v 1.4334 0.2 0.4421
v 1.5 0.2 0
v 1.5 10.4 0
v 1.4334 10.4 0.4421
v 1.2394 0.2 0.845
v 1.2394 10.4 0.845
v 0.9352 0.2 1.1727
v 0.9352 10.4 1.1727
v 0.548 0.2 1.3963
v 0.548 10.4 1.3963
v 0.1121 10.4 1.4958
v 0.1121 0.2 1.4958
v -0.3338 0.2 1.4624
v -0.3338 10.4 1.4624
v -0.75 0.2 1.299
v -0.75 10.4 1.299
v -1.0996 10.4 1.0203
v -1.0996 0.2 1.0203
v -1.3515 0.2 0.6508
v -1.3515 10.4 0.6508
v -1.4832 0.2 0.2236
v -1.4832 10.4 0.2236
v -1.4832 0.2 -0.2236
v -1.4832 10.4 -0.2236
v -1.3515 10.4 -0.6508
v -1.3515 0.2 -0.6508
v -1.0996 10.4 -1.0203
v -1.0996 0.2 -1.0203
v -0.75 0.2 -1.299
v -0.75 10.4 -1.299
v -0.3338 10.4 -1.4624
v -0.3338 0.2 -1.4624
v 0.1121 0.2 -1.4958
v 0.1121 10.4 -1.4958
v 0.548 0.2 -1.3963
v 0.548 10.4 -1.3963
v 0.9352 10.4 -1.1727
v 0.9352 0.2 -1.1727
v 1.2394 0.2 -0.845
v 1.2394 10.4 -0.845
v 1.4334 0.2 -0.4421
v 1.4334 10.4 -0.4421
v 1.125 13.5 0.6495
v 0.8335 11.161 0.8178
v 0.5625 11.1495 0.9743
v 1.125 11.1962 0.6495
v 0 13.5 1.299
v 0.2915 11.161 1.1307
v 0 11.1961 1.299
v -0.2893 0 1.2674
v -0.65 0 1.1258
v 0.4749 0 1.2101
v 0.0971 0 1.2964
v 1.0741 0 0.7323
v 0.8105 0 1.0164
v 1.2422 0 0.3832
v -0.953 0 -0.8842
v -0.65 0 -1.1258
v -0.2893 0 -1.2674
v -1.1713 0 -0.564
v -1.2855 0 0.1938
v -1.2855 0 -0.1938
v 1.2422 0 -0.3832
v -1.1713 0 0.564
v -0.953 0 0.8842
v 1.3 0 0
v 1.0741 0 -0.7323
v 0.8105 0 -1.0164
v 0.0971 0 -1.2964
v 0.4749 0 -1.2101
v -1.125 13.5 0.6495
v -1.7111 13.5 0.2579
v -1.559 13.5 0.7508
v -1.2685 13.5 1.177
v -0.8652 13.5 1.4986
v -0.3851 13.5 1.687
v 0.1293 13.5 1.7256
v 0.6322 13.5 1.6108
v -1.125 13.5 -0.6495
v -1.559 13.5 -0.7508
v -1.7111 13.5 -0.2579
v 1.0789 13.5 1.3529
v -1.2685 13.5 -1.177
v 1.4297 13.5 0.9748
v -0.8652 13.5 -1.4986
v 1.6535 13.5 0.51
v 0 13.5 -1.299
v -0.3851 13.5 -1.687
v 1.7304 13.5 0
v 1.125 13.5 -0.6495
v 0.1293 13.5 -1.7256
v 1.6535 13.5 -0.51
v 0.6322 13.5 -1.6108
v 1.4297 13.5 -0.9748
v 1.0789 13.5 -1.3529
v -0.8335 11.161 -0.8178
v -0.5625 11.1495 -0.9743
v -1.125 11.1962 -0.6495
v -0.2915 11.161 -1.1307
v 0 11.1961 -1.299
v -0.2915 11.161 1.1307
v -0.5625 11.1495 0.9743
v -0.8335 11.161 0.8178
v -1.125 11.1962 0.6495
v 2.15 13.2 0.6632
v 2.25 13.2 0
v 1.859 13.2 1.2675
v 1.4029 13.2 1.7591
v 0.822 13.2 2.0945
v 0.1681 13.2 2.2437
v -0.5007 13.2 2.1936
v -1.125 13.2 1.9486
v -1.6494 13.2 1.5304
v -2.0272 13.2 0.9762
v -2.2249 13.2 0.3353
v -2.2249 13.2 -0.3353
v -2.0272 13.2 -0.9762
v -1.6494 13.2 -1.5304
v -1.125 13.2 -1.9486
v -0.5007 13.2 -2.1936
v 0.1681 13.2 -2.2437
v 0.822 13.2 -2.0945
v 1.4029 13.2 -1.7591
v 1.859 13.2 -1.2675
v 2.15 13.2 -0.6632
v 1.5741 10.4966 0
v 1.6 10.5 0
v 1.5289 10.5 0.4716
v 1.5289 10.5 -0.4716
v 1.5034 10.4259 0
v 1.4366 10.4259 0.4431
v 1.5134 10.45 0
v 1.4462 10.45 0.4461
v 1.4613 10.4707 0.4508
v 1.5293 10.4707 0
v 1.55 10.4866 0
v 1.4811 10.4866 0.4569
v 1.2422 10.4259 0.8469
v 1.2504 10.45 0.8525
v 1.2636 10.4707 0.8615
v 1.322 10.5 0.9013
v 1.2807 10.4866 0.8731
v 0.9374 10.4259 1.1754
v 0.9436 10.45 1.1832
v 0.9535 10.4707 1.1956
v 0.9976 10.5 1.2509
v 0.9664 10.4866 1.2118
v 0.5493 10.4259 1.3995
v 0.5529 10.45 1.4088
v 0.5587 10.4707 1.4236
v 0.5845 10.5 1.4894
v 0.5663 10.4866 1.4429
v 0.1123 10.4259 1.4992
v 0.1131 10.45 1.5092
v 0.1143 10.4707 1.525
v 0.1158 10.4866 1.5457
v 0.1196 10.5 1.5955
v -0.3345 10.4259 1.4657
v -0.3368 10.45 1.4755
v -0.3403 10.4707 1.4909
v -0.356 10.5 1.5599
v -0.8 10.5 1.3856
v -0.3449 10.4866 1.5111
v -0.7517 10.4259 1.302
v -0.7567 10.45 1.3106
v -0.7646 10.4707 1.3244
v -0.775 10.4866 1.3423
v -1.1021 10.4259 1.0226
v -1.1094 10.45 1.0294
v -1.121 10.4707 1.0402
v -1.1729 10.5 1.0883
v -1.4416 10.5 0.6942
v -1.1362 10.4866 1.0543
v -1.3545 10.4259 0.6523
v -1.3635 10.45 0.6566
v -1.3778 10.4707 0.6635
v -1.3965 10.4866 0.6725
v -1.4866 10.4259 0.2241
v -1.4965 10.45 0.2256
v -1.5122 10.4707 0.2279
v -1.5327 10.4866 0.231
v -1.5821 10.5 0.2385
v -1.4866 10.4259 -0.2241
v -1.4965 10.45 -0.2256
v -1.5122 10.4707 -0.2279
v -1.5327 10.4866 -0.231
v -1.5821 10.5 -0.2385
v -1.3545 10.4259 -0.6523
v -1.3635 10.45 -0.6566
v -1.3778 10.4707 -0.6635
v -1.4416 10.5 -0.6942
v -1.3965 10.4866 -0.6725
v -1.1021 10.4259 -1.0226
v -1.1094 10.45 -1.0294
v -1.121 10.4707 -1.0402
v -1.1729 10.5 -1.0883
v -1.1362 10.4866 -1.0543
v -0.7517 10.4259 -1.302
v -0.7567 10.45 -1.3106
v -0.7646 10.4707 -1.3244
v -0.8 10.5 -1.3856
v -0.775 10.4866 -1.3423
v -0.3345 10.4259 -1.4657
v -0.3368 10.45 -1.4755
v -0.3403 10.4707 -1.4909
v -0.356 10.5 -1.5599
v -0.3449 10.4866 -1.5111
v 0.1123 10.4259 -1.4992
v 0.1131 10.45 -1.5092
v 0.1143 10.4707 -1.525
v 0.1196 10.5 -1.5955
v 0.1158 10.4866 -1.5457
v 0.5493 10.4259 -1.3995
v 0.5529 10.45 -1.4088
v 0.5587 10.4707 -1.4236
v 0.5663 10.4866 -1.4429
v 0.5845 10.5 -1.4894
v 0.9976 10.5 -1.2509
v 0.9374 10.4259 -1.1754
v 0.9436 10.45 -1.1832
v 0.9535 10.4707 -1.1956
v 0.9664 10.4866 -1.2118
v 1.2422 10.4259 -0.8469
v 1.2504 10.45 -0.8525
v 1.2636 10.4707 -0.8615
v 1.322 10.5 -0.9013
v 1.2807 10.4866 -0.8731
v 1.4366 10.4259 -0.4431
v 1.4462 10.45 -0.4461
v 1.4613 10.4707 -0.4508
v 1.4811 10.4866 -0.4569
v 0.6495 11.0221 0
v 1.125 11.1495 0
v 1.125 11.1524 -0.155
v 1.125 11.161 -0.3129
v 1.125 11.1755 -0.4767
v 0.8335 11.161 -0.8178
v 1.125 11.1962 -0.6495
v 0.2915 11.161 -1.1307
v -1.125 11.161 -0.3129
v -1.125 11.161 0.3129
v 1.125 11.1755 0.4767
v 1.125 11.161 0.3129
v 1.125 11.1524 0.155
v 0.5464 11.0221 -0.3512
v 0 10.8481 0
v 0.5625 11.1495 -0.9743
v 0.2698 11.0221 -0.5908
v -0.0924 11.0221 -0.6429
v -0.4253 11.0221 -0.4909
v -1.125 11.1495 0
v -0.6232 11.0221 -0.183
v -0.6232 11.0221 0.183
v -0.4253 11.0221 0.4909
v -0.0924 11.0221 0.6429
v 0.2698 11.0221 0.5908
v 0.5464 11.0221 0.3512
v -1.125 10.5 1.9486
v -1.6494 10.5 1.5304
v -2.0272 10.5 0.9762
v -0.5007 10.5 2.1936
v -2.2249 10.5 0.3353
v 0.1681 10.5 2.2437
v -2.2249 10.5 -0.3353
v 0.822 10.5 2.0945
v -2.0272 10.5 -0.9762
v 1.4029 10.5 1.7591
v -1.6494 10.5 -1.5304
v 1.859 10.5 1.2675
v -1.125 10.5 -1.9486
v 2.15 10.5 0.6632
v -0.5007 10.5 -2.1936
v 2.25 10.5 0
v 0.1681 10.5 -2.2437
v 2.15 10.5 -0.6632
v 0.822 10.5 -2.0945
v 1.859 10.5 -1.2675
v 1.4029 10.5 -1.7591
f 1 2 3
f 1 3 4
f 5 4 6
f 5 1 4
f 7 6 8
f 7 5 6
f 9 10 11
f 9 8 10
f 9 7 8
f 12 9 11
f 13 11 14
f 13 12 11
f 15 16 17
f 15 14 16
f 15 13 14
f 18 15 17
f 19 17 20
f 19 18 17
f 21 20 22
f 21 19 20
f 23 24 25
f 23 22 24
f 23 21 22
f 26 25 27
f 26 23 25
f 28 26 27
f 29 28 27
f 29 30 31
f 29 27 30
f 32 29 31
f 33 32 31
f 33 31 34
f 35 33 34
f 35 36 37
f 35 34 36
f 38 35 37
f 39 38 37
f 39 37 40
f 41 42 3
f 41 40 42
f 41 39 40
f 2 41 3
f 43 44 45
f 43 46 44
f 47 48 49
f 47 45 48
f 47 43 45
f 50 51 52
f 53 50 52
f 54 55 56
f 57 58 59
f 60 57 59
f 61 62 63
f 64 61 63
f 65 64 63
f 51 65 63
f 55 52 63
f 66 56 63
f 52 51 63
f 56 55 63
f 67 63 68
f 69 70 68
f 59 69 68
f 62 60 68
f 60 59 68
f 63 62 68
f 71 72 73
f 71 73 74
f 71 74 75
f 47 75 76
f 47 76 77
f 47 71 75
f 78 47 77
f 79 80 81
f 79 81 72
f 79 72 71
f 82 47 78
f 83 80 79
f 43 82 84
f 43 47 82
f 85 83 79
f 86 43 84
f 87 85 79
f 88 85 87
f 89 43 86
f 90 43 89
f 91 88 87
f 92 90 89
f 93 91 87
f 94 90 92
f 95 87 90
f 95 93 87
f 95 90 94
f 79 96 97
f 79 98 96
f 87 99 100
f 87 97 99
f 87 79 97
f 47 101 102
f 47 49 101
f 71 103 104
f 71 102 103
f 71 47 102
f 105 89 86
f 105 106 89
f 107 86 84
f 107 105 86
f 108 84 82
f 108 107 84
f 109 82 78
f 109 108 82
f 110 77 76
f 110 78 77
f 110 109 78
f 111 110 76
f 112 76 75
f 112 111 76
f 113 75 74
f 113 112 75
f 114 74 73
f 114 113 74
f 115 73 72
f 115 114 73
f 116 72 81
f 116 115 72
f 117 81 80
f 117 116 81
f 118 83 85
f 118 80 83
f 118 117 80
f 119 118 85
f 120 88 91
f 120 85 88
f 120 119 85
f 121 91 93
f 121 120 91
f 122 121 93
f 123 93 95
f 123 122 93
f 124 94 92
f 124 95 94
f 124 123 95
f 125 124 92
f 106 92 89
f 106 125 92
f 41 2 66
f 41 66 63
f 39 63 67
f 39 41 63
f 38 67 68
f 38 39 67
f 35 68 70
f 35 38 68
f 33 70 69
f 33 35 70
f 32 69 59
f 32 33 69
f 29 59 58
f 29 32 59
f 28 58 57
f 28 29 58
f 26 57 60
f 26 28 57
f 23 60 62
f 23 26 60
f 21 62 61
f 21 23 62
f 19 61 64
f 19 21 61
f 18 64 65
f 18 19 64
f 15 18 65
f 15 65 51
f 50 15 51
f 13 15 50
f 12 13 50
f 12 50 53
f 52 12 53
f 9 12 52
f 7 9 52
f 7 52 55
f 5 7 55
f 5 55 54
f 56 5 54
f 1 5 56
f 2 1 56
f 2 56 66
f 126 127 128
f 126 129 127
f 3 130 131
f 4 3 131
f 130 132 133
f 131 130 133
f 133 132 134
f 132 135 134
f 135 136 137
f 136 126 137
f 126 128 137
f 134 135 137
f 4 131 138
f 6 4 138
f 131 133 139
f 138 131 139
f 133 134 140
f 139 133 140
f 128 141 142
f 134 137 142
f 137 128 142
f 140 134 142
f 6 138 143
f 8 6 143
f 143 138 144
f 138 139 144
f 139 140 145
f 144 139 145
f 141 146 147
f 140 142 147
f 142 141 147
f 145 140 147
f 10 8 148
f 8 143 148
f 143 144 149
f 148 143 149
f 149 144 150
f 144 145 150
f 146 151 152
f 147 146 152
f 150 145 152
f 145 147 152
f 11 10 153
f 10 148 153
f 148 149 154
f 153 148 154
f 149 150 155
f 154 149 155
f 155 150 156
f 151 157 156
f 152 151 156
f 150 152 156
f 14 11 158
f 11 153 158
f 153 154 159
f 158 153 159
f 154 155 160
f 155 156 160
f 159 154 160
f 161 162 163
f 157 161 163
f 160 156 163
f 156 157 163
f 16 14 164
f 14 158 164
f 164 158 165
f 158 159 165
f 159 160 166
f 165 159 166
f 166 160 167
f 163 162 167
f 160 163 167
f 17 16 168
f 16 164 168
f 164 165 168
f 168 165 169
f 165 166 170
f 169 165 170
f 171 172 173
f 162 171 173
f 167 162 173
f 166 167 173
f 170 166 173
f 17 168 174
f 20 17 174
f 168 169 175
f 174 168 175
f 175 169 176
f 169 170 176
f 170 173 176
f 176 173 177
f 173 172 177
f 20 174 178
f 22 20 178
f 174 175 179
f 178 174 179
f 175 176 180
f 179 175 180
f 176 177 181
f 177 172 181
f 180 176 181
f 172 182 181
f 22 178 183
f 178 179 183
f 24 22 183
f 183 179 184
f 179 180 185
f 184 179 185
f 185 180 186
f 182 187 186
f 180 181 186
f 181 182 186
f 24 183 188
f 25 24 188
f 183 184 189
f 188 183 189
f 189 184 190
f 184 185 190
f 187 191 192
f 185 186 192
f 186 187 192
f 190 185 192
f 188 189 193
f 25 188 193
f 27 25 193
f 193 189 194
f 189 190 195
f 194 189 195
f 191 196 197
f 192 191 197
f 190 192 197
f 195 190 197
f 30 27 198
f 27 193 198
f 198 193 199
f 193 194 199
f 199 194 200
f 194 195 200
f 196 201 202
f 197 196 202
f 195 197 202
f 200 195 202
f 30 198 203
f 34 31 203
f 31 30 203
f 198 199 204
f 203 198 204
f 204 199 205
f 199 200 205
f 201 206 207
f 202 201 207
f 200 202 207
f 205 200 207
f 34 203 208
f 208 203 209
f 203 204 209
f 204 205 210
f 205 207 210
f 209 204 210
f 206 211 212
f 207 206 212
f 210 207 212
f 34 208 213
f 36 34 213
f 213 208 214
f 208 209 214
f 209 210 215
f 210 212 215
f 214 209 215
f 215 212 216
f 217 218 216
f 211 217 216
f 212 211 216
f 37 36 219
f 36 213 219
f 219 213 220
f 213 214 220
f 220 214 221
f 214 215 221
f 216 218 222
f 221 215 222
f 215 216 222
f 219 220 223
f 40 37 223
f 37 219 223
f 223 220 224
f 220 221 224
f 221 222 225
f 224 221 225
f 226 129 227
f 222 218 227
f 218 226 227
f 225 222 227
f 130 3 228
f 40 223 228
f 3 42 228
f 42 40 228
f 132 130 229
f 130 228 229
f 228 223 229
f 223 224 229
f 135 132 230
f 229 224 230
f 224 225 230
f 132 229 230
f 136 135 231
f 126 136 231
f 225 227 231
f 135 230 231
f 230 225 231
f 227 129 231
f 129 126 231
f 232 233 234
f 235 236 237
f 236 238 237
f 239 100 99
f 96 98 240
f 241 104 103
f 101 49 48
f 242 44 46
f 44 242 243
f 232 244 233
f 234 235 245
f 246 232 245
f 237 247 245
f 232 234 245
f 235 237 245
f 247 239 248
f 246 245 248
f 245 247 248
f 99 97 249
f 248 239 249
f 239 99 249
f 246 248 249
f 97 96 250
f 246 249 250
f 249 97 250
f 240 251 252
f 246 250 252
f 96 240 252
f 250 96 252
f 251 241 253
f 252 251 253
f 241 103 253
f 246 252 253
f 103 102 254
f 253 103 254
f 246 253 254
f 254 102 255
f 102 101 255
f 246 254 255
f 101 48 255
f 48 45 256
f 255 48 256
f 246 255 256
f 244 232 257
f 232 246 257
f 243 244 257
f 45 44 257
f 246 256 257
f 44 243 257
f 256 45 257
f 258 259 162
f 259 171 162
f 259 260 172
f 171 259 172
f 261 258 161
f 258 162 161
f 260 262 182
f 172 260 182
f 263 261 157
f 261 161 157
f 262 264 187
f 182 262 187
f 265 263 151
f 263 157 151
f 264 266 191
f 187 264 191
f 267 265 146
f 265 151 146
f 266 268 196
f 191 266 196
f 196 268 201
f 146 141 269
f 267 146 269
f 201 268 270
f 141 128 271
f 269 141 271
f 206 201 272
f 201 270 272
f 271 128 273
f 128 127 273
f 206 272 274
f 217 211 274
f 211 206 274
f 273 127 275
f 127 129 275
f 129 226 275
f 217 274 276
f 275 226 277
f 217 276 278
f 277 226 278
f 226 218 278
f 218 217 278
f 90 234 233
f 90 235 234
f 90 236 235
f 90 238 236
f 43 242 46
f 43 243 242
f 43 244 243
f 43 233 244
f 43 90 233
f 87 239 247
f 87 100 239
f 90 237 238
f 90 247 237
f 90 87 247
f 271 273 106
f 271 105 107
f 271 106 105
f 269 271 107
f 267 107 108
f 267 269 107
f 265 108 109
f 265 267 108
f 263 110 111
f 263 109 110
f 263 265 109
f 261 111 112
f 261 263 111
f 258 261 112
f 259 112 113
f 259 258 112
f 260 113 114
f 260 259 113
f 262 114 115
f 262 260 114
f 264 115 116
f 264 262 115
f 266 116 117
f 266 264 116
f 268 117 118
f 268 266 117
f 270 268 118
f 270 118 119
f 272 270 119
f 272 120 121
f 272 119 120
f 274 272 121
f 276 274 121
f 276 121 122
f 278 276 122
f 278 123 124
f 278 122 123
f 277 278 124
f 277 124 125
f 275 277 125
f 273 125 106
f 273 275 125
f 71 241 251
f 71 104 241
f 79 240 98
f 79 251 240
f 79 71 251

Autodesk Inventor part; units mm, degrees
ref_plane "YZ Plane" through (0, 0, 0) normal (1, 0, 0) x (0, 1, 0)
ref_plane "XZ Plane" through (0, 0, 0) normal (0, 1, 0) x (-1, 0, 0)
ref_plane "XY Plane" through (0, 0, 0) normal (0, 0, 1) x (1, 0, 0)
sketch "Sketch1" plane through (0, 0, 0) normal (0, 0, 1) x (1, 0, 0)
  line L0 (0, 0) -> (0, 10.8481)
  line L1 (0, 10.8481) -> (1.5, 11.25)
  line L2 (1.5, 11.25) -> (1.5, 13.5)
  line L3 (1.5, 13.5) -> (1.7304, 13.5)
  line L4 (2.25, 13.2) -> (2.25, 10.5)
  line L5 (2.25, 10.5) -> (1.5, 10.5)
  line L6 (1.5, 10.5) -> (1.5, 0)
  line L7 (1.5, 0) -> (0, 0)
  line L8 (1.7304, 13.5) -> (2.25, 13.2)
  dimension "Diameter" = 3
  dimension "d1" = 4.5
  dimension "d2" = 3
  dimension "Length" = 10.5
  dimension "d5" = 3
  dimension "d6" = 2.25
  dimension "d7" = 0.3
  dimension "d8" = 30
  dimension "d9" = 15
revolve "Revolution1" add sketch "Sketch1" angle 360 about axis through (0, 0, 0) along (0, 1, 0)
sketch "Sketch2" plane through (0, 13.5, 0) normal (0, 1, 0) x (1, 0, 0)
  circle A0 centre (0, 0) radius 1.5 projected
  line L0 (0, -1.299) -> (-1.125, -0.6495)
  line L1 (-1.125, -0.6495) -> (-1.125, 0.6495)
  line L2 (-1.125, 0.6495) -> (0, 1.299)
  line L3 (0, 1.299) -> (1.125, 0.6495)
  line L4 (1.125, 0.6495) -> (1.125, -0.6495)
  line L5 (1.125, -0.6495) -> (0, -1.299)
  dimension "d14" = 2.25
extrude "Extrusion1" add sketch "Sketch2" against normal up to next
thread "Thread2" size "M3x0.5" class "6g" standard "ANSI Metric M Profile" full length
chamfer "Chamfer2" distance 0.2 angle 45 1 edges at (-1.5, 0, 0)
fillet "Fillet1" radius 0.1 1 edges at (-1.5, 10.5, 0)
equation "\"d1\" = 1.5 * Diameter"
equation "\"d2\" = Diameter"
equation "\"d5\" = Diameter"
equation "\"d6\" = 0.75 * Diameter"
equation "\"d7\" = 0.1 * Diameter"
equation "\"d14\" = 0.75 * Diameter"
properties part number "Hex Socket Screw"
